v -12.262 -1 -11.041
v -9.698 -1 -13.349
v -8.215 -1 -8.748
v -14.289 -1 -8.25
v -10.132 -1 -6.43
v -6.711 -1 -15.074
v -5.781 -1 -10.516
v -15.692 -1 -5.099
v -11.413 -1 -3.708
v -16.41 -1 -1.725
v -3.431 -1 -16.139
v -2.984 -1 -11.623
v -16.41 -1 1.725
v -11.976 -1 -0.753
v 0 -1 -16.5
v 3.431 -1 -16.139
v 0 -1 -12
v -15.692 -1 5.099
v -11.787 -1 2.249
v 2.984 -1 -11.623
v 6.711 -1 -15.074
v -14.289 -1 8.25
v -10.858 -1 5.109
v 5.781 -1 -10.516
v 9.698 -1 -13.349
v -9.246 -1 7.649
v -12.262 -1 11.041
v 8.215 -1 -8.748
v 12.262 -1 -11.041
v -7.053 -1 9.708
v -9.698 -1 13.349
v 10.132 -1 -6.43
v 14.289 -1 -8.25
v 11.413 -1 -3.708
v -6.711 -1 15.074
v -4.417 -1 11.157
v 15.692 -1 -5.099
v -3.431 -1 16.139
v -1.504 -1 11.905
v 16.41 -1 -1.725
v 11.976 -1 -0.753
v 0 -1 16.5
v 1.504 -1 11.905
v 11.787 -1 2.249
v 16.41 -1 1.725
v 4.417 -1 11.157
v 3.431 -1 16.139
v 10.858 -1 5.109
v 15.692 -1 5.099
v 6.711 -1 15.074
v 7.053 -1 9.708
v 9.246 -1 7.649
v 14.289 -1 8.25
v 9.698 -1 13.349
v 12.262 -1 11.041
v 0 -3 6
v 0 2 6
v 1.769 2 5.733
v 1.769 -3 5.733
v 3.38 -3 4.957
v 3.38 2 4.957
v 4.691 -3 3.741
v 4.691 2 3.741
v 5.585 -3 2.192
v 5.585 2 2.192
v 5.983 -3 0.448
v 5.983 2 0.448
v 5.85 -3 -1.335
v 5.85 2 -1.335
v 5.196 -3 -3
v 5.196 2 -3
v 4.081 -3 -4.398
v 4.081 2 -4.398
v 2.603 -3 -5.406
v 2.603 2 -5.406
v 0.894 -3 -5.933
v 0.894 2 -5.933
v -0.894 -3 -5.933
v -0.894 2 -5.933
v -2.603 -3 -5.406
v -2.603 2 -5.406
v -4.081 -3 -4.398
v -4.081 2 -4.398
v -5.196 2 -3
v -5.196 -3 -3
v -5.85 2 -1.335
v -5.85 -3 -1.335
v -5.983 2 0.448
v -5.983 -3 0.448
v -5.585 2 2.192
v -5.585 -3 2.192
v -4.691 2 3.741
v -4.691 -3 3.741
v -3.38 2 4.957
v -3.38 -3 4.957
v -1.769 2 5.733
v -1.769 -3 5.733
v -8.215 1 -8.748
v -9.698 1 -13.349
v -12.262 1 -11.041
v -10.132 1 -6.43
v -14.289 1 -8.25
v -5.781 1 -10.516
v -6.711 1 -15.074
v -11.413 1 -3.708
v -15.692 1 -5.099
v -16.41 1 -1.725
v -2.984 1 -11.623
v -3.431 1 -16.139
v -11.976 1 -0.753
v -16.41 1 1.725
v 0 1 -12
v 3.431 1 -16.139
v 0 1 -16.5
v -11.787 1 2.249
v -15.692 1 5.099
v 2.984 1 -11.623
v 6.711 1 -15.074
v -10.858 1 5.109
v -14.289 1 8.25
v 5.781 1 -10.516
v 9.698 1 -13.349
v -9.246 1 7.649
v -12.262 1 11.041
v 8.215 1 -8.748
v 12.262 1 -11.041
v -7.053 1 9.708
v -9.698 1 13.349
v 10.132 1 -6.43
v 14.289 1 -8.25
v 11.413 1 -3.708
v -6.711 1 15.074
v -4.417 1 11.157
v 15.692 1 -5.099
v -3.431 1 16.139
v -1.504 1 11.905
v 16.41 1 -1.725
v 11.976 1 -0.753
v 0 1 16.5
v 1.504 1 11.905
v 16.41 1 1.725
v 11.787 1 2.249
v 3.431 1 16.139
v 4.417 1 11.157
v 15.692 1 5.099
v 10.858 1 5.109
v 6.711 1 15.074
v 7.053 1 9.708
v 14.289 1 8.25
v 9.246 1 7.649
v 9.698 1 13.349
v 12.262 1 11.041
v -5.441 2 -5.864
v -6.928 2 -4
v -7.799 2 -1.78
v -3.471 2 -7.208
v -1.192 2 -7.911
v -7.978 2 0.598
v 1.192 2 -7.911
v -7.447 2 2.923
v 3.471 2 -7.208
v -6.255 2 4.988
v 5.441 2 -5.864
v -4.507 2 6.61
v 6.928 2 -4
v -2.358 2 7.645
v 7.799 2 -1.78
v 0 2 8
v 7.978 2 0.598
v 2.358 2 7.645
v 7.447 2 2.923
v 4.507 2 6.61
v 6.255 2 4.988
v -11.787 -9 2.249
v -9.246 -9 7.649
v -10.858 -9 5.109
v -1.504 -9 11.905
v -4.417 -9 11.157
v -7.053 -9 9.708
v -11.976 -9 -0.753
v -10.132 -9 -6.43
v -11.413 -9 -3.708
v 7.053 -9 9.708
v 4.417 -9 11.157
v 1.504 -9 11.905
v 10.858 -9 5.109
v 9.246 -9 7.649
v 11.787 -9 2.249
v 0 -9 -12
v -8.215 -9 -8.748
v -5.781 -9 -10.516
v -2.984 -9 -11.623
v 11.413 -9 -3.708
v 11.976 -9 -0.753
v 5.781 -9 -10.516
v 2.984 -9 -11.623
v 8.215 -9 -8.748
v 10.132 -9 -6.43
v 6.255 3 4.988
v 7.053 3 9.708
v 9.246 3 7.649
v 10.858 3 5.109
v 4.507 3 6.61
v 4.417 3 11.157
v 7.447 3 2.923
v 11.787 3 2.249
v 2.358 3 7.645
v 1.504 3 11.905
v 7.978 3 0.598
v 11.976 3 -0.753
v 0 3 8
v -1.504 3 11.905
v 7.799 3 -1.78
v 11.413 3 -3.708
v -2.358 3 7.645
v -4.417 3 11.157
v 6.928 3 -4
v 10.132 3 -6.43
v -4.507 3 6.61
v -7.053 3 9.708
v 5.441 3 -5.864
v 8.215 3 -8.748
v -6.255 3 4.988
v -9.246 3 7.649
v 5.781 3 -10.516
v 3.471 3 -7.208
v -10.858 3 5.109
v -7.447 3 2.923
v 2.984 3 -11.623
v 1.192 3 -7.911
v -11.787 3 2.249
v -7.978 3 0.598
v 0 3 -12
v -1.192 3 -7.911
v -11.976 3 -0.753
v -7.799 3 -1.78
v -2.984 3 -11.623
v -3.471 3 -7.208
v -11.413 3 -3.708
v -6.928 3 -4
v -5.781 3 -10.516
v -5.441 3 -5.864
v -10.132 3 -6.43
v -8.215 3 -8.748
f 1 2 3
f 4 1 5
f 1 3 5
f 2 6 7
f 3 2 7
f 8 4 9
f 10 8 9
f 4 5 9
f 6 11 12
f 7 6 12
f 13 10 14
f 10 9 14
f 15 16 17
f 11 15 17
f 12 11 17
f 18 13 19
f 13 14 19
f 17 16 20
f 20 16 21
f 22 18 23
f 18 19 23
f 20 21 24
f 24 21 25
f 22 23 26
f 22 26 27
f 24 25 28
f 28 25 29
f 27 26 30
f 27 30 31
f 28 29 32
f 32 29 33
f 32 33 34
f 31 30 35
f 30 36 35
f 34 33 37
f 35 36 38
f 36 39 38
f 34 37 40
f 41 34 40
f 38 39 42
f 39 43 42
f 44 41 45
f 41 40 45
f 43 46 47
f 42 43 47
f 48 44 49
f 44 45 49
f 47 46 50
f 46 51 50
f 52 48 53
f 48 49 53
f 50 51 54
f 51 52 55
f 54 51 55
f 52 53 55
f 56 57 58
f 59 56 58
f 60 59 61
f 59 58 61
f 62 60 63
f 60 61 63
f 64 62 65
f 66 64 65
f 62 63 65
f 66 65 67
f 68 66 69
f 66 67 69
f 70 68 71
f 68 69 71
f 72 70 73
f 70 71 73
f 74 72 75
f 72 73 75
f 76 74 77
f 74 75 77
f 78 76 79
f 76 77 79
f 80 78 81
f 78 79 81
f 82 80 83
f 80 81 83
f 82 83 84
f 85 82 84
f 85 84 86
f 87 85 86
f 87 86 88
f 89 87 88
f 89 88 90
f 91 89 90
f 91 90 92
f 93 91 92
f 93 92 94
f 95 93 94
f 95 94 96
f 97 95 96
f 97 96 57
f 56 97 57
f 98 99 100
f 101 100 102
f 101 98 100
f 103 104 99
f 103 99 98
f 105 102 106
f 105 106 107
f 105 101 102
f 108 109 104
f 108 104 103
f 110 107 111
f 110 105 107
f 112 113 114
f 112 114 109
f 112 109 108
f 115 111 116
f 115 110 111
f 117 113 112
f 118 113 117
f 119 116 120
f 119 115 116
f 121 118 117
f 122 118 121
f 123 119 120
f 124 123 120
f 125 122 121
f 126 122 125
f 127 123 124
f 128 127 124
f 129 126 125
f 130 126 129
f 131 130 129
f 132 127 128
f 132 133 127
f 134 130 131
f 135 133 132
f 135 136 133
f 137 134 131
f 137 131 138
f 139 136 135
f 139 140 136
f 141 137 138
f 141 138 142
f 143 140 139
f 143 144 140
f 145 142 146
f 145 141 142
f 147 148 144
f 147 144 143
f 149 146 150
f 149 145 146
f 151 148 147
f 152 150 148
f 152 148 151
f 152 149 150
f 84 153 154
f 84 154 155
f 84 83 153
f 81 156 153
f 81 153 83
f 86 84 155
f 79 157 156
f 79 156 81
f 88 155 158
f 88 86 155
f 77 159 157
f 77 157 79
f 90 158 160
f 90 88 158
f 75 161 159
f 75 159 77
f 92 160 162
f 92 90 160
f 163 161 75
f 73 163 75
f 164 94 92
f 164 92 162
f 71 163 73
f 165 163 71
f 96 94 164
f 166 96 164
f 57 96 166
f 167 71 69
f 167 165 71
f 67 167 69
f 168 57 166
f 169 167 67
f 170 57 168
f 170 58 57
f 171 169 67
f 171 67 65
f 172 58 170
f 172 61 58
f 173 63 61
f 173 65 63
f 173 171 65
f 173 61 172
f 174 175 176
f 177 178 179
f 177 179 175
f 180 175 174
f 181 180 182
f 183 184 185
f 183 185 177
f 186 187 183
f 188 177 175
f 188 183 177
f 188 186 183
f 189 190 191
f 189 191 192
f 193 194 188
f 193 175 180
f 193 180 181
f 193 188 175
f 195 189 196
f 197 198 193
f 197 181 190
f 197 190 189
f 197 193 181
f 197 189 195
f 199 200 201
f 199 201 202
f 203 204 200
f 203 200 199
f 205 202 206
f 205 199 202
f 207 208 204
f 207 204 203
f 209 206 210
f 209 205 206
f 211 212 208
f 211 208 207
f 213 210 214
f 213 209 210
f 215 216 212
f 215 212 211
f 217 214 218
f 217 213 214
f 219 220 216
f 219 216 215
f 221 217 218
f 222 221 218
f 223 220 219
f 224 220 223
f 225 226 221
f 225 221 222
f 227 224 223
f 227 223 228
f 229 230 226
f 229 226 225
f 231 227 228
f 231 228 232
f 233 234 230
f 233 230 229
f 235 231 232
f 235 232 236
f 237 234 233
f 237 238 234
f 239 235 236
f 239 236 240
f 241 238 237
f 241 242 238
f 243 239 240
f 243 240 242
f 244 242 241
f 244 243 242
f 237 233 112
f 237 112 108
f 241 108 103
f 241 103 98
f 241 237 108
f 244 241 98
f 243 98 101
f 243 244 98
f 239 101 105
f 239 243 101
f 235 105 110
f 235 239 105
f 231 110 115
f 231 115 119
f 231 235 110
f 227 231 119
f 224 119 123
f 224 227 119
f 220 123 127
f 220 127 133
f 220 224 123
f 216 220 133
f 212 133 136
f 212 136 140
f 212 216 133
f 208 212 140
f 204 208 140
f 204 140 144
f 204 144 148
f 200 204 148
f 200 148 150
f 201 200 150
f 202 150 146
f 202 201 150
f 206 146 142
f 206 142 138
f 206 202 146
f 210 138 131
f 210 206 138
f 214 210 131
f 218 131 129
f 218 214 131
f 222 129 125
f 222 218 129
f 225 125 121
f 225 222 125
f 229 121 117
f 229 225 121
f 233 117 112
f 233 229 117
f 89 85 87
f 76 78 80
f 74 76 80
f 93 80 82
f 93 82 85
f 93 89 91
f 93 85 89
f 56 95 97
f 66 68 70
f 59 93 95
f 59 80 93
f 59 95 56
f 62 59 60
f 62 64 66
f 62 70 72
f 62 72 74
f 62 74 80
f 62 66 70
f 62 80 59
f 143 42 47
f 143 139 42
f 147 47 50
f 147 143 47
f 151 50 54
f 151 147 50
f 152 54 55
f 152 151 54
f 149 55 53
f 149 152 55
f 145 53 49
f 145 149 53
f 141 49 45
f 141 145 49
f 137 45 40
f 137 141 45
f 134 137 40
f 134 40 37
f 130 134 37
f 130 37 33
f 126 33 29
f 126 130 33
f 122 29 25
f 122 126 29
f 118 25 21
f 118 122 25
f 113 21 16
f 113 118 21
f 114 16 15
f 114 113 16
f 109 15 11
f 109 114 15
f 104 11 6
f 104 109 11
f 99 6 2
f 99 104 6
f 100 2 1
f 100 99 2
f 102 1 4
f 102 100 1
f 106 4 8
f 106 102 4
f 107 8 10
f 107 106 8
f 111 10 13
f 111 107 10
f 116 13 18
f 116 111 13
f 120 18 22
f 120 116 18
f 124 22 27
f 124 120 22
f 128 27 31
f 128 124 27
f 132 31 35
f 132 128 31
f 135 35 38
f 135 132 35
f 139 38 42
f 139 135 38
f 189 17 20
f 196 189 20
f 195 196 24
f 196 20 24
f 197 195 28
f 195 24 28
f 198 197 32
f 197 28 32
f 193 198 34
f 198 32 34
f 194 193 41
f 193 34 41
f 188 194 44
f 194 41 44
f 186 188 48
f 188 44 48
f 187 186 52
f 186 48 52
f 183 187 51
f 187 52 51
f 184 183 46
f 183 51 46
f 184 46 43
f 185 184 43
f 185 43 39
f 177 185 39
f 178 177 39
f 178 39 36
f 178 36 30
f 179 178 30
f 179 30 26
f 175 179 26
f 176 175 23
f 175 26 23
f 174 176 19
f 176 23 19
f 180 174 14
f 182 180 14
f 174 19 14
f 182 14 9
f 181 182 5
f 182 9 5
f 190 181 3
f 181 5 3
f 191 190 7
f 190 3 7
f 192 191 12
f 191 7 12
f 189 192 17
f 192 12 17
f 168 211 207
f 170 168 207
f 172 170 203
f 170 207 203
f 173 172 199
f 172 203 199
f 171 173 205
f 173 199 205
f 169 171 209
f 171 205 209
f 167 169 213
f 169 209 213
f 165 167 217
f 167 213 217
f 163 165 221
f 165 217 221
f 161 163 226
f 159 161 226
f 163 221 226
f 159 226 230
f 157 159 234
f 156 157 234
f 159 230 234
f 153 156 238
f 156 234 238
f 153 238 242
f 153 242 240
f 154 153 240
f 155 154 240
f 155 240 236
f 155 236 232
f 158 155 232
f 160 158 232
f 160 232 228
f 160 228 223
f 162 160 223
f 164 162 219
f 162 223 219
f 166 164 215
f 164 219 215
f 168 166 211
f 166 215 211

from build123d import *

# Parameters (mm, degrees)
SKETCH2_R           = 16.5
BOSS_EXTRUDE1_DEPTH = 1
SKETCH3_R           = 12
BOSS_EXTRUDE2_DEPTH = 8
BOSS_EXTRUDE3_START = 2
SKETCH4_R           = 12
BOSS_EXTRUDE3_DEPTH = 2
SKETCH5_R           = 6
CUT_EXTRUDE1_DEPTH  = 6
SKETCH6_R           = 8
CUT_EXTRUDE2_DEPTH  = 1


with BuildPart() as part:
    # Sketch2 → Boss-Extrude1 (new, symmetric)
    with BuildSketch(Plane(origin=(0, 0, 0), x_dir=(1, 0, 0), z_dir=(0, 1, 0))):
        with Locations(Location((0, 0, 0), (0, 0, 270))):
            Circle(SKETCH2_R)
    extrude(amount=BOSS_EXTRUDE1_DEPTH, both=True)

    # Sketch3 → Boss-Extrude2 (add)
    with BuildSketch(Plane.XZ.offset(1)):
        with Locations(Location((0, 0, 0), (0, 0, 270))):
            Circle(SKETCH3_R)
    extrude(amount=BOSS_EXTRUDE2_DEPTH)

    # Sketch4 → Boss-Extrude3 (add)
    with BuildSketch(Plane(origin=(0, 1, 0), x_dir=(1, 0, 0), z_dir=(0, 1, 0)).offset(BOSS_EXTRUDE3_START)):
        with Locations(Location((0, 0, 0), (0, 0, 90))):
            Circle(SKETCH4_R)
    extrude(amount=-BOSS_EXTRUDE3_DEPTH)

    # Sketch5 → Cut-Extrude1 (cut)
    with BuildSketch(Plane(origin=(0, 3, 0), x_dir=(1, 0, 0), z_dir=(0, 1, 0))):
        with Locations(Location((0, 0, 0), (0, 0, 270))):
            Circle(SKETCH5_R)
    extrude(amount=-CUT_EXTRUDE1_DEPTH, mode=Mode.SUBTRACT)

    # Sketch6 → Cut-Extrude2 (cut)
    with BuildSketch(Plane(origin=(0, 3, 0), x_dir=(1, 0, 0), z_dir=(0, 1, 0))):
        with Locations(Location((0, 0, 0), (0, 0, 270))):
            Circle(SKETCH6_R)
    extrude(amount=-CUT_EXTRUDE2_DEPTH, mode=Mode.SUBTRACT)


solid = part.part
